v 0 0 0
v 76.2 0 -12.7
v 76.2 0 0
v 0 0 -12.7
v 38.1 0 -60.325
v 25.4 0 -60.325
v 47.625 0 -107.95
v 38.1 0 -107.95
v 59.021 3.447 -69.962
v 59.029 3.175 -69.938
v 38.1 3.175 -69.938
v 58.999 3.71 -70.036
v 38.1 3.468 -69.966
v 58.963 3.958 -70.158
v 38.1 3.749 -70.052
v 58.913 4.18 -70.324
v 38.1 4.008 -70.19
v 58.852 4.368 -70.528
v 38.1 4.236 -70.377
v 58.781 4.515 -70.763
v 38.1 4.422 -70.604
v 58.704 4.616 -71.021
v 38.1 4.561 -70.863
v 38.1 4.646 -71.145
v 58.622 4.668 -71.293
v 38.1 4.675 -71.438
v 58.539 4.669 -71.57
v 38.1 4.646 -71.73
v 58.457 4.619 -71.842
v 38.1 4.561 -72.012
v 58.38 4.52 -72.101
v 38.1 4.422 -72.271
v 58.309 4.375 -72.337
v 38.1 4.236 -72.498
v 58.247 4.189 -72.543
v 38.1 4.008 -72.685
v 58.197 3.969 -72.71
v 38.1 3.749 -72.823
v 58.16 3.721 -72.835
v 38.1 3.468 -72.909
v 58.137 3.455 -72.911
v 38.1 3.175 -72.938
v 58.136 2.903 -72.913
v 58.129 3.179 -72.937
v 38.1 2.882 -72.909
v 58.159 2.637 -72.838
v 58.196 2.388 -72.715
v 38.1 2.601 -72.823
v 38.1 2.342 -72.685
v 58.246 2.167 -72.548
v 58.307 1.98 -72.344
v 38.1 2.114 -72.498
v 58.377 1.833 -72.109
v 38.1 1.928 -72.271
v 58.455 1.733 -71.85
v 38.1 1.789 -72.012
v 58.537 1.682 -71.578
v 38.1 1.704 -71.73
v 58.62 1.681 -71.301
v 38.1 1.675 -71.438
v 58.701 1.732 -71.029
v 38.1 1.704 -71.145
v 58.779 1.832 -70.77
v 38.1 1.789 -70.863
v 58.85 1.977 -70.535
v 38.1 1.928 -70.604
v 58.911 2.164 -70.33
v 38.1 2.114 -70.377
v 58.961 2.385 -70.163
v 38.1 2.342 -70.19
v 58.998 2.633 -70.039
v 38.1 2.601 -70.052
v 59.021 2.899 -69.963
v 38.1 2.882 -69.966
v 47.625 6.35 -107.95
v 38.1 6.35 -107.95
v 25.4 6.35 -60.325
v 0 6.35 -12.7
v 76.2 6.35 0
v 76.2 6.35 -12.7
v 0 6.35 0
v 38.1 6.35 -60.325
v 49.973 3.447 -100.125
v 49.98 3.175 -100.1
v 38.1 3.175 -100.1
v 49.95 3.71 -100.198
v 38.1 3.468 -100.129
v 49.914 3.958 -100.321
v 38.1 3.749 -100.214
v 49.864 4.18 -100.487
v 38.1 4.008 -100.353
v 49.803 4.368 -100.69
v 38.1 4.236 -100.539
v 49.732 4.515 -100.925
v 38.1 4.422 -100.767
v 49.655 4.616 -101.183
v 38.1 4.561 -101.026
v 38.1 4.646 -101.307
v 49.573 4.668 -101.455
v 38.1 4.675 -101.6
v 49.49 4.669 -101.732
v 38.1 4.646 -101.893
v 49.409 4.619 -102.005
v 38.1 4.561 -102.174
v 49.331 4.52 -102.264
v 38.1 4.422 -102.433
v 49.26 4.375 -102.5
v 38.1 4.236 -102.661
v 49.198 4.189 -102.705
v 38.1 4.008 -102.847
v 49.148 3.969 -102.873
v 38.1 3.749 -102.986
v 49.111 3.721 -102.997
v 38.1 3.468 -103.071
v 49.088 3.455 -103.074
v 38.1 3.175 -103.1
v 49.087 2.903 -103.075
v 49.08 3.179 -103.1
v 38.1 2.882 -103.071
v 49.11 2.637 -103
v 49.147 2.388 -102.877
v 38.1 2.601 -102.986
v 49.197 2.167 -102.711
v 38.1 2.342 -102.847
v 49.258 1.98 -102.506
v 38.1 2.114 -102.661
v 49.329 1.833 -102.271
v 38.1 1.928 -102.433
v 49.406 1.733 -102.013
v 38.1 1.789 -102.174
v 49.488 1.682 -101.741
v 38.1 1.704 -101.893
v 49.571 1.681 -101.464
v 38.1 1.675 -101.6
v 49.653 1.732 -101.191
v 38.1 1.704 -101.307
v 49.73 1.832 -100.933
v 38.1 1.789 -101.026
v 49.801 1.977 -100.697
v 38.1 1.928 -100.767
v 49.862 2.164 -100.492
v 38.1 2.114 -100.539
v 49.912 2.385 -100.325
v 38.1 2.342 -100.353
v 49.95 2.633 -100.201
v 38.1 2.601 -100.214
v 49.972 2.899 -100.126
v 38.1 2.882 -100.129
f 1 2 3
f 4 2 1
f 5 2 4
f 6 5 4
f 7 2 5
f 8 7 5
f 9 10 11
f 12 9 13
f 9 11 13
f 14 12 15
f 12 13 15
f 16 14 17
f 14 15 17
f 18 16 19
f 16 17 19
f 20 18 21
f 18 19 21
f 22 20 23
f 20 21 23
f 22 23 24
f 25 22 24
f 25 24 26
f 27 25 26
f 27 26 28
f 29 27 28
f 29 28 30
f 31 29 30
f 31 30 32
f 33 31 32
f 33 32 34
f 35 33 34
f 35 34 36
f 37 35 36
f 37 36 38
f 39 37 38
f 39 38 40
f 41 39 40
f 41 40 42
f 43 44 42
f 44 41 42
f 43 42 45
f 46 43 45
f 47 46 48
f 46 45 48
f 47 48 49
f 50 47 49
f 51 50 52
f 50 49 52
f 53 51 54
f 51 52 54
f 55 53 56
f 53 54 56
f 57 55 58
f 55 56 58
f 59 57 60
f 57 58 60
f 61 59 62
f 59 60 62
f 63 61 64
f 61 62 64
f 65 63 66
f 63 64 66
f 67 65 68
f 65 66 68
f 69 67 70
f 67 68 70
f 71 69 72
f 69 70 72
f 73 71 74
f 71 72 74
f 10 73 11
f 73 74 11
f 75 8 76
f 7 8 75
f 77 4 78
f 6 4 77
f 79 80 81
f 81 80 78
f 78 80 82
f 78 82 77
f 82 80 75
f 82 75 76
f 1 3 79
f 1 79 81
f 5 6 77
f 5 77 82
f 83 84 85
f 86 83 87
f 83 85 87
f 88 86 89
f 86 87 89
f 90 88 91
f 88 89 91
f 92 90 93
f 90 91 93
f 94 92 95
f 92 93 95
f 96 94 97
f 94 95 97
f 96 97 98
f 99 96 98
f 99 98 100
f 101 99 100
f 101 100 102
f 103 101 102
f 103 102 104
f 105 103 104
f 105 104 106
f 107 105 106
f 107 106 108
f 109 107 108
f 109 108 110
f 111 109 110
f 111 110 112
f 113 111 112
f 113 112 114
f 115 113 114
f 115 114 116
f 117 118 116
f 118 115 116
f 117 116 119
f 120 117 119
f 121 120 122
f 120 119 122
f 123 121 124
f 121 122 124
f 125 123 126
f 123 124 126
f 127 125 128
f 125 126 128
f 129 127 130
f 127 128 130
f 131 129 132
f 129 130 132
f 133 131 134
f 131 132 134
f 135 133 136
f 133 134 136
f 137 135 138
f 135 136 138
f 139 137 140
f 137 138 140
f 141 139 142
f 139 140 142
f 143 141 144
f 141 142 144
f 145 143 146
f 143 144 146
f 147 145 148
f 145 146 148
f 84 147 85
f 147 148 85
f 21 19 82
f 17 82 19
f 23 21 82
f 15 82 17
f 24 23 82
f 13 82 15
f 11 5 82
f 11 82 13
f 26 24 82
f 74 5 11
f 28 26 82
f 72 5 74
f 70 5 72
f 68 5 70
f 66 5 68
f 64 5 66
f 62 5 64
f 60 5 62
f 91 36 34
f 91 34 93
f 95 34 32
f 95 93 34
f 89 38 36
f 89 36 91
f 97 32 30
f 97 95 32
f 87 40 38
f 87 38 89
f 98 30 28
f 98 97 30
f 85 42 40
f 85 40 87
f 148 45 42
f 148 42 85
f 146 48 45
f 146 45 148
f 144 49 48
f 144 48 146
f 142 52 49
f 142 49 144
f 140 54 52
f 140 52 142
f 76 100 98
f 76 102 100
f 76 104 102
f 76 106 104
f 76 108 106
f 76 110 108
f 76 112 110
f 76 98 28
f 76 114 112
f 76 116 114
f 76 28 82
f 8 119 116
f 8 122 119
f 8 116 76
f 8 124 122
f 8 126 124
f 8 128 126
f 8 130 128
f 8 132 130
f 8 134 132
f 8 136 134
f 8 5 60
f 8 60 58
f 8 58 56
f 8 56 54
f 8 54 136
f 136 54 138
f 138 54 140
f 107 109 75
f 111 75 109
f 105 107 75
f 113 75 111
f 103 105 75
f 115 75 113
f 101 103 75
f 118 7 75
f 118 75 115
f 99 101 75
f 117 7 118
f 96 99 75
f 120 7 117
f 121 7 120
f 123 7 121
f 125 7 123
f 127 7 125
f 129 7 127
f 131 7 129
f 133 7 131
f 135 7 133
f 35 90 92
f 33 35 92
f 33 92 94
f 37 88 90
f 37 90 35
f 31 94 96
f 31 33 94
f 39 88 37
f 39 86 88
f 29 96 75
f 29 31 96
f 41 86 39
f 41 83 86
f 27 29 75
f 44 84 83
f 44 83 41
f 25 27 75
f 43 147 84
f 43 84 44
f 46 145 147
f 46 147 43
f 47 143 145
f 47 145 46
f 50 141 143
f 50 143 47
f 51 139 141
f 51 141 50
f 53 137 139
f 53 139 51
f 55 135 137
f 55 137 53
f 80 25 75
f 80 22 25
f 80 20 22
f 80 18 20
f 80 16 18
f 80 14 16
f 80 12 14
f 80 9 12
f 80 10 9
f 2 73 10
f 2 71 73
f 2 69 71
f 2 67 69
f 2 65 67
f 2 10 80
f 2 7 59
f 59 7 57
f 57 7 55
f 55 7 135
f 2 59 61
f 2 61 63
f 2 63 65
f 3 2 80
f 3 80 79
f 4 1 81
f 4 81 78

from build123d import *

# Parameters (mm, degrees)
BOSS_EXTRUDE1_DEPTH     = 6.35
SKETCH2_R               = 1.5
CUT_EXTRUDE1_DEPTH      = 39.1
CUT_EXTRUDE1_DEPTH_BACK = 39.1


with BuildPart() as part:
    # Sketch1 → Boss-Extrude1 (new body)
    with BuildSketch(Plane(origin=(0, 0, 0), x_dir=(1, 0, 0), z_dir=(0, 1, 0))):
        Polygon((0, 0), (0, 12.7), (25.4, 60.325), (38.1, 60.325), (38.1, 107.95), (47.625, 107.95), (76.2, 12.7), (76.2, 0), align=None)
    extrude(amount=BOSS_EXTRUDE1_DEPTH)

    # Sketch2 → Cut-Extrude1 (cut, two sides)
    with BuildSketch(Plane.ZY.offset(-38.1)) as cut_extrude1_sk:
        with Locations((-101.6, 3.175)):
            Circle(SKETCH2_R)
        with Locations((-71.4375, 3.175)):
            Circle(SKETCH2_R)
    extrude(amount=CUT_EXTRUDE1_DEPTH, mode=Mode.SUBTRACT)
    extrude(cut_extrude1_sk.sketch, amount=-CUT_EXTRUDE1_DEPTH_BACK, mode=Mode.SUBTRACT)


solid = part.part
